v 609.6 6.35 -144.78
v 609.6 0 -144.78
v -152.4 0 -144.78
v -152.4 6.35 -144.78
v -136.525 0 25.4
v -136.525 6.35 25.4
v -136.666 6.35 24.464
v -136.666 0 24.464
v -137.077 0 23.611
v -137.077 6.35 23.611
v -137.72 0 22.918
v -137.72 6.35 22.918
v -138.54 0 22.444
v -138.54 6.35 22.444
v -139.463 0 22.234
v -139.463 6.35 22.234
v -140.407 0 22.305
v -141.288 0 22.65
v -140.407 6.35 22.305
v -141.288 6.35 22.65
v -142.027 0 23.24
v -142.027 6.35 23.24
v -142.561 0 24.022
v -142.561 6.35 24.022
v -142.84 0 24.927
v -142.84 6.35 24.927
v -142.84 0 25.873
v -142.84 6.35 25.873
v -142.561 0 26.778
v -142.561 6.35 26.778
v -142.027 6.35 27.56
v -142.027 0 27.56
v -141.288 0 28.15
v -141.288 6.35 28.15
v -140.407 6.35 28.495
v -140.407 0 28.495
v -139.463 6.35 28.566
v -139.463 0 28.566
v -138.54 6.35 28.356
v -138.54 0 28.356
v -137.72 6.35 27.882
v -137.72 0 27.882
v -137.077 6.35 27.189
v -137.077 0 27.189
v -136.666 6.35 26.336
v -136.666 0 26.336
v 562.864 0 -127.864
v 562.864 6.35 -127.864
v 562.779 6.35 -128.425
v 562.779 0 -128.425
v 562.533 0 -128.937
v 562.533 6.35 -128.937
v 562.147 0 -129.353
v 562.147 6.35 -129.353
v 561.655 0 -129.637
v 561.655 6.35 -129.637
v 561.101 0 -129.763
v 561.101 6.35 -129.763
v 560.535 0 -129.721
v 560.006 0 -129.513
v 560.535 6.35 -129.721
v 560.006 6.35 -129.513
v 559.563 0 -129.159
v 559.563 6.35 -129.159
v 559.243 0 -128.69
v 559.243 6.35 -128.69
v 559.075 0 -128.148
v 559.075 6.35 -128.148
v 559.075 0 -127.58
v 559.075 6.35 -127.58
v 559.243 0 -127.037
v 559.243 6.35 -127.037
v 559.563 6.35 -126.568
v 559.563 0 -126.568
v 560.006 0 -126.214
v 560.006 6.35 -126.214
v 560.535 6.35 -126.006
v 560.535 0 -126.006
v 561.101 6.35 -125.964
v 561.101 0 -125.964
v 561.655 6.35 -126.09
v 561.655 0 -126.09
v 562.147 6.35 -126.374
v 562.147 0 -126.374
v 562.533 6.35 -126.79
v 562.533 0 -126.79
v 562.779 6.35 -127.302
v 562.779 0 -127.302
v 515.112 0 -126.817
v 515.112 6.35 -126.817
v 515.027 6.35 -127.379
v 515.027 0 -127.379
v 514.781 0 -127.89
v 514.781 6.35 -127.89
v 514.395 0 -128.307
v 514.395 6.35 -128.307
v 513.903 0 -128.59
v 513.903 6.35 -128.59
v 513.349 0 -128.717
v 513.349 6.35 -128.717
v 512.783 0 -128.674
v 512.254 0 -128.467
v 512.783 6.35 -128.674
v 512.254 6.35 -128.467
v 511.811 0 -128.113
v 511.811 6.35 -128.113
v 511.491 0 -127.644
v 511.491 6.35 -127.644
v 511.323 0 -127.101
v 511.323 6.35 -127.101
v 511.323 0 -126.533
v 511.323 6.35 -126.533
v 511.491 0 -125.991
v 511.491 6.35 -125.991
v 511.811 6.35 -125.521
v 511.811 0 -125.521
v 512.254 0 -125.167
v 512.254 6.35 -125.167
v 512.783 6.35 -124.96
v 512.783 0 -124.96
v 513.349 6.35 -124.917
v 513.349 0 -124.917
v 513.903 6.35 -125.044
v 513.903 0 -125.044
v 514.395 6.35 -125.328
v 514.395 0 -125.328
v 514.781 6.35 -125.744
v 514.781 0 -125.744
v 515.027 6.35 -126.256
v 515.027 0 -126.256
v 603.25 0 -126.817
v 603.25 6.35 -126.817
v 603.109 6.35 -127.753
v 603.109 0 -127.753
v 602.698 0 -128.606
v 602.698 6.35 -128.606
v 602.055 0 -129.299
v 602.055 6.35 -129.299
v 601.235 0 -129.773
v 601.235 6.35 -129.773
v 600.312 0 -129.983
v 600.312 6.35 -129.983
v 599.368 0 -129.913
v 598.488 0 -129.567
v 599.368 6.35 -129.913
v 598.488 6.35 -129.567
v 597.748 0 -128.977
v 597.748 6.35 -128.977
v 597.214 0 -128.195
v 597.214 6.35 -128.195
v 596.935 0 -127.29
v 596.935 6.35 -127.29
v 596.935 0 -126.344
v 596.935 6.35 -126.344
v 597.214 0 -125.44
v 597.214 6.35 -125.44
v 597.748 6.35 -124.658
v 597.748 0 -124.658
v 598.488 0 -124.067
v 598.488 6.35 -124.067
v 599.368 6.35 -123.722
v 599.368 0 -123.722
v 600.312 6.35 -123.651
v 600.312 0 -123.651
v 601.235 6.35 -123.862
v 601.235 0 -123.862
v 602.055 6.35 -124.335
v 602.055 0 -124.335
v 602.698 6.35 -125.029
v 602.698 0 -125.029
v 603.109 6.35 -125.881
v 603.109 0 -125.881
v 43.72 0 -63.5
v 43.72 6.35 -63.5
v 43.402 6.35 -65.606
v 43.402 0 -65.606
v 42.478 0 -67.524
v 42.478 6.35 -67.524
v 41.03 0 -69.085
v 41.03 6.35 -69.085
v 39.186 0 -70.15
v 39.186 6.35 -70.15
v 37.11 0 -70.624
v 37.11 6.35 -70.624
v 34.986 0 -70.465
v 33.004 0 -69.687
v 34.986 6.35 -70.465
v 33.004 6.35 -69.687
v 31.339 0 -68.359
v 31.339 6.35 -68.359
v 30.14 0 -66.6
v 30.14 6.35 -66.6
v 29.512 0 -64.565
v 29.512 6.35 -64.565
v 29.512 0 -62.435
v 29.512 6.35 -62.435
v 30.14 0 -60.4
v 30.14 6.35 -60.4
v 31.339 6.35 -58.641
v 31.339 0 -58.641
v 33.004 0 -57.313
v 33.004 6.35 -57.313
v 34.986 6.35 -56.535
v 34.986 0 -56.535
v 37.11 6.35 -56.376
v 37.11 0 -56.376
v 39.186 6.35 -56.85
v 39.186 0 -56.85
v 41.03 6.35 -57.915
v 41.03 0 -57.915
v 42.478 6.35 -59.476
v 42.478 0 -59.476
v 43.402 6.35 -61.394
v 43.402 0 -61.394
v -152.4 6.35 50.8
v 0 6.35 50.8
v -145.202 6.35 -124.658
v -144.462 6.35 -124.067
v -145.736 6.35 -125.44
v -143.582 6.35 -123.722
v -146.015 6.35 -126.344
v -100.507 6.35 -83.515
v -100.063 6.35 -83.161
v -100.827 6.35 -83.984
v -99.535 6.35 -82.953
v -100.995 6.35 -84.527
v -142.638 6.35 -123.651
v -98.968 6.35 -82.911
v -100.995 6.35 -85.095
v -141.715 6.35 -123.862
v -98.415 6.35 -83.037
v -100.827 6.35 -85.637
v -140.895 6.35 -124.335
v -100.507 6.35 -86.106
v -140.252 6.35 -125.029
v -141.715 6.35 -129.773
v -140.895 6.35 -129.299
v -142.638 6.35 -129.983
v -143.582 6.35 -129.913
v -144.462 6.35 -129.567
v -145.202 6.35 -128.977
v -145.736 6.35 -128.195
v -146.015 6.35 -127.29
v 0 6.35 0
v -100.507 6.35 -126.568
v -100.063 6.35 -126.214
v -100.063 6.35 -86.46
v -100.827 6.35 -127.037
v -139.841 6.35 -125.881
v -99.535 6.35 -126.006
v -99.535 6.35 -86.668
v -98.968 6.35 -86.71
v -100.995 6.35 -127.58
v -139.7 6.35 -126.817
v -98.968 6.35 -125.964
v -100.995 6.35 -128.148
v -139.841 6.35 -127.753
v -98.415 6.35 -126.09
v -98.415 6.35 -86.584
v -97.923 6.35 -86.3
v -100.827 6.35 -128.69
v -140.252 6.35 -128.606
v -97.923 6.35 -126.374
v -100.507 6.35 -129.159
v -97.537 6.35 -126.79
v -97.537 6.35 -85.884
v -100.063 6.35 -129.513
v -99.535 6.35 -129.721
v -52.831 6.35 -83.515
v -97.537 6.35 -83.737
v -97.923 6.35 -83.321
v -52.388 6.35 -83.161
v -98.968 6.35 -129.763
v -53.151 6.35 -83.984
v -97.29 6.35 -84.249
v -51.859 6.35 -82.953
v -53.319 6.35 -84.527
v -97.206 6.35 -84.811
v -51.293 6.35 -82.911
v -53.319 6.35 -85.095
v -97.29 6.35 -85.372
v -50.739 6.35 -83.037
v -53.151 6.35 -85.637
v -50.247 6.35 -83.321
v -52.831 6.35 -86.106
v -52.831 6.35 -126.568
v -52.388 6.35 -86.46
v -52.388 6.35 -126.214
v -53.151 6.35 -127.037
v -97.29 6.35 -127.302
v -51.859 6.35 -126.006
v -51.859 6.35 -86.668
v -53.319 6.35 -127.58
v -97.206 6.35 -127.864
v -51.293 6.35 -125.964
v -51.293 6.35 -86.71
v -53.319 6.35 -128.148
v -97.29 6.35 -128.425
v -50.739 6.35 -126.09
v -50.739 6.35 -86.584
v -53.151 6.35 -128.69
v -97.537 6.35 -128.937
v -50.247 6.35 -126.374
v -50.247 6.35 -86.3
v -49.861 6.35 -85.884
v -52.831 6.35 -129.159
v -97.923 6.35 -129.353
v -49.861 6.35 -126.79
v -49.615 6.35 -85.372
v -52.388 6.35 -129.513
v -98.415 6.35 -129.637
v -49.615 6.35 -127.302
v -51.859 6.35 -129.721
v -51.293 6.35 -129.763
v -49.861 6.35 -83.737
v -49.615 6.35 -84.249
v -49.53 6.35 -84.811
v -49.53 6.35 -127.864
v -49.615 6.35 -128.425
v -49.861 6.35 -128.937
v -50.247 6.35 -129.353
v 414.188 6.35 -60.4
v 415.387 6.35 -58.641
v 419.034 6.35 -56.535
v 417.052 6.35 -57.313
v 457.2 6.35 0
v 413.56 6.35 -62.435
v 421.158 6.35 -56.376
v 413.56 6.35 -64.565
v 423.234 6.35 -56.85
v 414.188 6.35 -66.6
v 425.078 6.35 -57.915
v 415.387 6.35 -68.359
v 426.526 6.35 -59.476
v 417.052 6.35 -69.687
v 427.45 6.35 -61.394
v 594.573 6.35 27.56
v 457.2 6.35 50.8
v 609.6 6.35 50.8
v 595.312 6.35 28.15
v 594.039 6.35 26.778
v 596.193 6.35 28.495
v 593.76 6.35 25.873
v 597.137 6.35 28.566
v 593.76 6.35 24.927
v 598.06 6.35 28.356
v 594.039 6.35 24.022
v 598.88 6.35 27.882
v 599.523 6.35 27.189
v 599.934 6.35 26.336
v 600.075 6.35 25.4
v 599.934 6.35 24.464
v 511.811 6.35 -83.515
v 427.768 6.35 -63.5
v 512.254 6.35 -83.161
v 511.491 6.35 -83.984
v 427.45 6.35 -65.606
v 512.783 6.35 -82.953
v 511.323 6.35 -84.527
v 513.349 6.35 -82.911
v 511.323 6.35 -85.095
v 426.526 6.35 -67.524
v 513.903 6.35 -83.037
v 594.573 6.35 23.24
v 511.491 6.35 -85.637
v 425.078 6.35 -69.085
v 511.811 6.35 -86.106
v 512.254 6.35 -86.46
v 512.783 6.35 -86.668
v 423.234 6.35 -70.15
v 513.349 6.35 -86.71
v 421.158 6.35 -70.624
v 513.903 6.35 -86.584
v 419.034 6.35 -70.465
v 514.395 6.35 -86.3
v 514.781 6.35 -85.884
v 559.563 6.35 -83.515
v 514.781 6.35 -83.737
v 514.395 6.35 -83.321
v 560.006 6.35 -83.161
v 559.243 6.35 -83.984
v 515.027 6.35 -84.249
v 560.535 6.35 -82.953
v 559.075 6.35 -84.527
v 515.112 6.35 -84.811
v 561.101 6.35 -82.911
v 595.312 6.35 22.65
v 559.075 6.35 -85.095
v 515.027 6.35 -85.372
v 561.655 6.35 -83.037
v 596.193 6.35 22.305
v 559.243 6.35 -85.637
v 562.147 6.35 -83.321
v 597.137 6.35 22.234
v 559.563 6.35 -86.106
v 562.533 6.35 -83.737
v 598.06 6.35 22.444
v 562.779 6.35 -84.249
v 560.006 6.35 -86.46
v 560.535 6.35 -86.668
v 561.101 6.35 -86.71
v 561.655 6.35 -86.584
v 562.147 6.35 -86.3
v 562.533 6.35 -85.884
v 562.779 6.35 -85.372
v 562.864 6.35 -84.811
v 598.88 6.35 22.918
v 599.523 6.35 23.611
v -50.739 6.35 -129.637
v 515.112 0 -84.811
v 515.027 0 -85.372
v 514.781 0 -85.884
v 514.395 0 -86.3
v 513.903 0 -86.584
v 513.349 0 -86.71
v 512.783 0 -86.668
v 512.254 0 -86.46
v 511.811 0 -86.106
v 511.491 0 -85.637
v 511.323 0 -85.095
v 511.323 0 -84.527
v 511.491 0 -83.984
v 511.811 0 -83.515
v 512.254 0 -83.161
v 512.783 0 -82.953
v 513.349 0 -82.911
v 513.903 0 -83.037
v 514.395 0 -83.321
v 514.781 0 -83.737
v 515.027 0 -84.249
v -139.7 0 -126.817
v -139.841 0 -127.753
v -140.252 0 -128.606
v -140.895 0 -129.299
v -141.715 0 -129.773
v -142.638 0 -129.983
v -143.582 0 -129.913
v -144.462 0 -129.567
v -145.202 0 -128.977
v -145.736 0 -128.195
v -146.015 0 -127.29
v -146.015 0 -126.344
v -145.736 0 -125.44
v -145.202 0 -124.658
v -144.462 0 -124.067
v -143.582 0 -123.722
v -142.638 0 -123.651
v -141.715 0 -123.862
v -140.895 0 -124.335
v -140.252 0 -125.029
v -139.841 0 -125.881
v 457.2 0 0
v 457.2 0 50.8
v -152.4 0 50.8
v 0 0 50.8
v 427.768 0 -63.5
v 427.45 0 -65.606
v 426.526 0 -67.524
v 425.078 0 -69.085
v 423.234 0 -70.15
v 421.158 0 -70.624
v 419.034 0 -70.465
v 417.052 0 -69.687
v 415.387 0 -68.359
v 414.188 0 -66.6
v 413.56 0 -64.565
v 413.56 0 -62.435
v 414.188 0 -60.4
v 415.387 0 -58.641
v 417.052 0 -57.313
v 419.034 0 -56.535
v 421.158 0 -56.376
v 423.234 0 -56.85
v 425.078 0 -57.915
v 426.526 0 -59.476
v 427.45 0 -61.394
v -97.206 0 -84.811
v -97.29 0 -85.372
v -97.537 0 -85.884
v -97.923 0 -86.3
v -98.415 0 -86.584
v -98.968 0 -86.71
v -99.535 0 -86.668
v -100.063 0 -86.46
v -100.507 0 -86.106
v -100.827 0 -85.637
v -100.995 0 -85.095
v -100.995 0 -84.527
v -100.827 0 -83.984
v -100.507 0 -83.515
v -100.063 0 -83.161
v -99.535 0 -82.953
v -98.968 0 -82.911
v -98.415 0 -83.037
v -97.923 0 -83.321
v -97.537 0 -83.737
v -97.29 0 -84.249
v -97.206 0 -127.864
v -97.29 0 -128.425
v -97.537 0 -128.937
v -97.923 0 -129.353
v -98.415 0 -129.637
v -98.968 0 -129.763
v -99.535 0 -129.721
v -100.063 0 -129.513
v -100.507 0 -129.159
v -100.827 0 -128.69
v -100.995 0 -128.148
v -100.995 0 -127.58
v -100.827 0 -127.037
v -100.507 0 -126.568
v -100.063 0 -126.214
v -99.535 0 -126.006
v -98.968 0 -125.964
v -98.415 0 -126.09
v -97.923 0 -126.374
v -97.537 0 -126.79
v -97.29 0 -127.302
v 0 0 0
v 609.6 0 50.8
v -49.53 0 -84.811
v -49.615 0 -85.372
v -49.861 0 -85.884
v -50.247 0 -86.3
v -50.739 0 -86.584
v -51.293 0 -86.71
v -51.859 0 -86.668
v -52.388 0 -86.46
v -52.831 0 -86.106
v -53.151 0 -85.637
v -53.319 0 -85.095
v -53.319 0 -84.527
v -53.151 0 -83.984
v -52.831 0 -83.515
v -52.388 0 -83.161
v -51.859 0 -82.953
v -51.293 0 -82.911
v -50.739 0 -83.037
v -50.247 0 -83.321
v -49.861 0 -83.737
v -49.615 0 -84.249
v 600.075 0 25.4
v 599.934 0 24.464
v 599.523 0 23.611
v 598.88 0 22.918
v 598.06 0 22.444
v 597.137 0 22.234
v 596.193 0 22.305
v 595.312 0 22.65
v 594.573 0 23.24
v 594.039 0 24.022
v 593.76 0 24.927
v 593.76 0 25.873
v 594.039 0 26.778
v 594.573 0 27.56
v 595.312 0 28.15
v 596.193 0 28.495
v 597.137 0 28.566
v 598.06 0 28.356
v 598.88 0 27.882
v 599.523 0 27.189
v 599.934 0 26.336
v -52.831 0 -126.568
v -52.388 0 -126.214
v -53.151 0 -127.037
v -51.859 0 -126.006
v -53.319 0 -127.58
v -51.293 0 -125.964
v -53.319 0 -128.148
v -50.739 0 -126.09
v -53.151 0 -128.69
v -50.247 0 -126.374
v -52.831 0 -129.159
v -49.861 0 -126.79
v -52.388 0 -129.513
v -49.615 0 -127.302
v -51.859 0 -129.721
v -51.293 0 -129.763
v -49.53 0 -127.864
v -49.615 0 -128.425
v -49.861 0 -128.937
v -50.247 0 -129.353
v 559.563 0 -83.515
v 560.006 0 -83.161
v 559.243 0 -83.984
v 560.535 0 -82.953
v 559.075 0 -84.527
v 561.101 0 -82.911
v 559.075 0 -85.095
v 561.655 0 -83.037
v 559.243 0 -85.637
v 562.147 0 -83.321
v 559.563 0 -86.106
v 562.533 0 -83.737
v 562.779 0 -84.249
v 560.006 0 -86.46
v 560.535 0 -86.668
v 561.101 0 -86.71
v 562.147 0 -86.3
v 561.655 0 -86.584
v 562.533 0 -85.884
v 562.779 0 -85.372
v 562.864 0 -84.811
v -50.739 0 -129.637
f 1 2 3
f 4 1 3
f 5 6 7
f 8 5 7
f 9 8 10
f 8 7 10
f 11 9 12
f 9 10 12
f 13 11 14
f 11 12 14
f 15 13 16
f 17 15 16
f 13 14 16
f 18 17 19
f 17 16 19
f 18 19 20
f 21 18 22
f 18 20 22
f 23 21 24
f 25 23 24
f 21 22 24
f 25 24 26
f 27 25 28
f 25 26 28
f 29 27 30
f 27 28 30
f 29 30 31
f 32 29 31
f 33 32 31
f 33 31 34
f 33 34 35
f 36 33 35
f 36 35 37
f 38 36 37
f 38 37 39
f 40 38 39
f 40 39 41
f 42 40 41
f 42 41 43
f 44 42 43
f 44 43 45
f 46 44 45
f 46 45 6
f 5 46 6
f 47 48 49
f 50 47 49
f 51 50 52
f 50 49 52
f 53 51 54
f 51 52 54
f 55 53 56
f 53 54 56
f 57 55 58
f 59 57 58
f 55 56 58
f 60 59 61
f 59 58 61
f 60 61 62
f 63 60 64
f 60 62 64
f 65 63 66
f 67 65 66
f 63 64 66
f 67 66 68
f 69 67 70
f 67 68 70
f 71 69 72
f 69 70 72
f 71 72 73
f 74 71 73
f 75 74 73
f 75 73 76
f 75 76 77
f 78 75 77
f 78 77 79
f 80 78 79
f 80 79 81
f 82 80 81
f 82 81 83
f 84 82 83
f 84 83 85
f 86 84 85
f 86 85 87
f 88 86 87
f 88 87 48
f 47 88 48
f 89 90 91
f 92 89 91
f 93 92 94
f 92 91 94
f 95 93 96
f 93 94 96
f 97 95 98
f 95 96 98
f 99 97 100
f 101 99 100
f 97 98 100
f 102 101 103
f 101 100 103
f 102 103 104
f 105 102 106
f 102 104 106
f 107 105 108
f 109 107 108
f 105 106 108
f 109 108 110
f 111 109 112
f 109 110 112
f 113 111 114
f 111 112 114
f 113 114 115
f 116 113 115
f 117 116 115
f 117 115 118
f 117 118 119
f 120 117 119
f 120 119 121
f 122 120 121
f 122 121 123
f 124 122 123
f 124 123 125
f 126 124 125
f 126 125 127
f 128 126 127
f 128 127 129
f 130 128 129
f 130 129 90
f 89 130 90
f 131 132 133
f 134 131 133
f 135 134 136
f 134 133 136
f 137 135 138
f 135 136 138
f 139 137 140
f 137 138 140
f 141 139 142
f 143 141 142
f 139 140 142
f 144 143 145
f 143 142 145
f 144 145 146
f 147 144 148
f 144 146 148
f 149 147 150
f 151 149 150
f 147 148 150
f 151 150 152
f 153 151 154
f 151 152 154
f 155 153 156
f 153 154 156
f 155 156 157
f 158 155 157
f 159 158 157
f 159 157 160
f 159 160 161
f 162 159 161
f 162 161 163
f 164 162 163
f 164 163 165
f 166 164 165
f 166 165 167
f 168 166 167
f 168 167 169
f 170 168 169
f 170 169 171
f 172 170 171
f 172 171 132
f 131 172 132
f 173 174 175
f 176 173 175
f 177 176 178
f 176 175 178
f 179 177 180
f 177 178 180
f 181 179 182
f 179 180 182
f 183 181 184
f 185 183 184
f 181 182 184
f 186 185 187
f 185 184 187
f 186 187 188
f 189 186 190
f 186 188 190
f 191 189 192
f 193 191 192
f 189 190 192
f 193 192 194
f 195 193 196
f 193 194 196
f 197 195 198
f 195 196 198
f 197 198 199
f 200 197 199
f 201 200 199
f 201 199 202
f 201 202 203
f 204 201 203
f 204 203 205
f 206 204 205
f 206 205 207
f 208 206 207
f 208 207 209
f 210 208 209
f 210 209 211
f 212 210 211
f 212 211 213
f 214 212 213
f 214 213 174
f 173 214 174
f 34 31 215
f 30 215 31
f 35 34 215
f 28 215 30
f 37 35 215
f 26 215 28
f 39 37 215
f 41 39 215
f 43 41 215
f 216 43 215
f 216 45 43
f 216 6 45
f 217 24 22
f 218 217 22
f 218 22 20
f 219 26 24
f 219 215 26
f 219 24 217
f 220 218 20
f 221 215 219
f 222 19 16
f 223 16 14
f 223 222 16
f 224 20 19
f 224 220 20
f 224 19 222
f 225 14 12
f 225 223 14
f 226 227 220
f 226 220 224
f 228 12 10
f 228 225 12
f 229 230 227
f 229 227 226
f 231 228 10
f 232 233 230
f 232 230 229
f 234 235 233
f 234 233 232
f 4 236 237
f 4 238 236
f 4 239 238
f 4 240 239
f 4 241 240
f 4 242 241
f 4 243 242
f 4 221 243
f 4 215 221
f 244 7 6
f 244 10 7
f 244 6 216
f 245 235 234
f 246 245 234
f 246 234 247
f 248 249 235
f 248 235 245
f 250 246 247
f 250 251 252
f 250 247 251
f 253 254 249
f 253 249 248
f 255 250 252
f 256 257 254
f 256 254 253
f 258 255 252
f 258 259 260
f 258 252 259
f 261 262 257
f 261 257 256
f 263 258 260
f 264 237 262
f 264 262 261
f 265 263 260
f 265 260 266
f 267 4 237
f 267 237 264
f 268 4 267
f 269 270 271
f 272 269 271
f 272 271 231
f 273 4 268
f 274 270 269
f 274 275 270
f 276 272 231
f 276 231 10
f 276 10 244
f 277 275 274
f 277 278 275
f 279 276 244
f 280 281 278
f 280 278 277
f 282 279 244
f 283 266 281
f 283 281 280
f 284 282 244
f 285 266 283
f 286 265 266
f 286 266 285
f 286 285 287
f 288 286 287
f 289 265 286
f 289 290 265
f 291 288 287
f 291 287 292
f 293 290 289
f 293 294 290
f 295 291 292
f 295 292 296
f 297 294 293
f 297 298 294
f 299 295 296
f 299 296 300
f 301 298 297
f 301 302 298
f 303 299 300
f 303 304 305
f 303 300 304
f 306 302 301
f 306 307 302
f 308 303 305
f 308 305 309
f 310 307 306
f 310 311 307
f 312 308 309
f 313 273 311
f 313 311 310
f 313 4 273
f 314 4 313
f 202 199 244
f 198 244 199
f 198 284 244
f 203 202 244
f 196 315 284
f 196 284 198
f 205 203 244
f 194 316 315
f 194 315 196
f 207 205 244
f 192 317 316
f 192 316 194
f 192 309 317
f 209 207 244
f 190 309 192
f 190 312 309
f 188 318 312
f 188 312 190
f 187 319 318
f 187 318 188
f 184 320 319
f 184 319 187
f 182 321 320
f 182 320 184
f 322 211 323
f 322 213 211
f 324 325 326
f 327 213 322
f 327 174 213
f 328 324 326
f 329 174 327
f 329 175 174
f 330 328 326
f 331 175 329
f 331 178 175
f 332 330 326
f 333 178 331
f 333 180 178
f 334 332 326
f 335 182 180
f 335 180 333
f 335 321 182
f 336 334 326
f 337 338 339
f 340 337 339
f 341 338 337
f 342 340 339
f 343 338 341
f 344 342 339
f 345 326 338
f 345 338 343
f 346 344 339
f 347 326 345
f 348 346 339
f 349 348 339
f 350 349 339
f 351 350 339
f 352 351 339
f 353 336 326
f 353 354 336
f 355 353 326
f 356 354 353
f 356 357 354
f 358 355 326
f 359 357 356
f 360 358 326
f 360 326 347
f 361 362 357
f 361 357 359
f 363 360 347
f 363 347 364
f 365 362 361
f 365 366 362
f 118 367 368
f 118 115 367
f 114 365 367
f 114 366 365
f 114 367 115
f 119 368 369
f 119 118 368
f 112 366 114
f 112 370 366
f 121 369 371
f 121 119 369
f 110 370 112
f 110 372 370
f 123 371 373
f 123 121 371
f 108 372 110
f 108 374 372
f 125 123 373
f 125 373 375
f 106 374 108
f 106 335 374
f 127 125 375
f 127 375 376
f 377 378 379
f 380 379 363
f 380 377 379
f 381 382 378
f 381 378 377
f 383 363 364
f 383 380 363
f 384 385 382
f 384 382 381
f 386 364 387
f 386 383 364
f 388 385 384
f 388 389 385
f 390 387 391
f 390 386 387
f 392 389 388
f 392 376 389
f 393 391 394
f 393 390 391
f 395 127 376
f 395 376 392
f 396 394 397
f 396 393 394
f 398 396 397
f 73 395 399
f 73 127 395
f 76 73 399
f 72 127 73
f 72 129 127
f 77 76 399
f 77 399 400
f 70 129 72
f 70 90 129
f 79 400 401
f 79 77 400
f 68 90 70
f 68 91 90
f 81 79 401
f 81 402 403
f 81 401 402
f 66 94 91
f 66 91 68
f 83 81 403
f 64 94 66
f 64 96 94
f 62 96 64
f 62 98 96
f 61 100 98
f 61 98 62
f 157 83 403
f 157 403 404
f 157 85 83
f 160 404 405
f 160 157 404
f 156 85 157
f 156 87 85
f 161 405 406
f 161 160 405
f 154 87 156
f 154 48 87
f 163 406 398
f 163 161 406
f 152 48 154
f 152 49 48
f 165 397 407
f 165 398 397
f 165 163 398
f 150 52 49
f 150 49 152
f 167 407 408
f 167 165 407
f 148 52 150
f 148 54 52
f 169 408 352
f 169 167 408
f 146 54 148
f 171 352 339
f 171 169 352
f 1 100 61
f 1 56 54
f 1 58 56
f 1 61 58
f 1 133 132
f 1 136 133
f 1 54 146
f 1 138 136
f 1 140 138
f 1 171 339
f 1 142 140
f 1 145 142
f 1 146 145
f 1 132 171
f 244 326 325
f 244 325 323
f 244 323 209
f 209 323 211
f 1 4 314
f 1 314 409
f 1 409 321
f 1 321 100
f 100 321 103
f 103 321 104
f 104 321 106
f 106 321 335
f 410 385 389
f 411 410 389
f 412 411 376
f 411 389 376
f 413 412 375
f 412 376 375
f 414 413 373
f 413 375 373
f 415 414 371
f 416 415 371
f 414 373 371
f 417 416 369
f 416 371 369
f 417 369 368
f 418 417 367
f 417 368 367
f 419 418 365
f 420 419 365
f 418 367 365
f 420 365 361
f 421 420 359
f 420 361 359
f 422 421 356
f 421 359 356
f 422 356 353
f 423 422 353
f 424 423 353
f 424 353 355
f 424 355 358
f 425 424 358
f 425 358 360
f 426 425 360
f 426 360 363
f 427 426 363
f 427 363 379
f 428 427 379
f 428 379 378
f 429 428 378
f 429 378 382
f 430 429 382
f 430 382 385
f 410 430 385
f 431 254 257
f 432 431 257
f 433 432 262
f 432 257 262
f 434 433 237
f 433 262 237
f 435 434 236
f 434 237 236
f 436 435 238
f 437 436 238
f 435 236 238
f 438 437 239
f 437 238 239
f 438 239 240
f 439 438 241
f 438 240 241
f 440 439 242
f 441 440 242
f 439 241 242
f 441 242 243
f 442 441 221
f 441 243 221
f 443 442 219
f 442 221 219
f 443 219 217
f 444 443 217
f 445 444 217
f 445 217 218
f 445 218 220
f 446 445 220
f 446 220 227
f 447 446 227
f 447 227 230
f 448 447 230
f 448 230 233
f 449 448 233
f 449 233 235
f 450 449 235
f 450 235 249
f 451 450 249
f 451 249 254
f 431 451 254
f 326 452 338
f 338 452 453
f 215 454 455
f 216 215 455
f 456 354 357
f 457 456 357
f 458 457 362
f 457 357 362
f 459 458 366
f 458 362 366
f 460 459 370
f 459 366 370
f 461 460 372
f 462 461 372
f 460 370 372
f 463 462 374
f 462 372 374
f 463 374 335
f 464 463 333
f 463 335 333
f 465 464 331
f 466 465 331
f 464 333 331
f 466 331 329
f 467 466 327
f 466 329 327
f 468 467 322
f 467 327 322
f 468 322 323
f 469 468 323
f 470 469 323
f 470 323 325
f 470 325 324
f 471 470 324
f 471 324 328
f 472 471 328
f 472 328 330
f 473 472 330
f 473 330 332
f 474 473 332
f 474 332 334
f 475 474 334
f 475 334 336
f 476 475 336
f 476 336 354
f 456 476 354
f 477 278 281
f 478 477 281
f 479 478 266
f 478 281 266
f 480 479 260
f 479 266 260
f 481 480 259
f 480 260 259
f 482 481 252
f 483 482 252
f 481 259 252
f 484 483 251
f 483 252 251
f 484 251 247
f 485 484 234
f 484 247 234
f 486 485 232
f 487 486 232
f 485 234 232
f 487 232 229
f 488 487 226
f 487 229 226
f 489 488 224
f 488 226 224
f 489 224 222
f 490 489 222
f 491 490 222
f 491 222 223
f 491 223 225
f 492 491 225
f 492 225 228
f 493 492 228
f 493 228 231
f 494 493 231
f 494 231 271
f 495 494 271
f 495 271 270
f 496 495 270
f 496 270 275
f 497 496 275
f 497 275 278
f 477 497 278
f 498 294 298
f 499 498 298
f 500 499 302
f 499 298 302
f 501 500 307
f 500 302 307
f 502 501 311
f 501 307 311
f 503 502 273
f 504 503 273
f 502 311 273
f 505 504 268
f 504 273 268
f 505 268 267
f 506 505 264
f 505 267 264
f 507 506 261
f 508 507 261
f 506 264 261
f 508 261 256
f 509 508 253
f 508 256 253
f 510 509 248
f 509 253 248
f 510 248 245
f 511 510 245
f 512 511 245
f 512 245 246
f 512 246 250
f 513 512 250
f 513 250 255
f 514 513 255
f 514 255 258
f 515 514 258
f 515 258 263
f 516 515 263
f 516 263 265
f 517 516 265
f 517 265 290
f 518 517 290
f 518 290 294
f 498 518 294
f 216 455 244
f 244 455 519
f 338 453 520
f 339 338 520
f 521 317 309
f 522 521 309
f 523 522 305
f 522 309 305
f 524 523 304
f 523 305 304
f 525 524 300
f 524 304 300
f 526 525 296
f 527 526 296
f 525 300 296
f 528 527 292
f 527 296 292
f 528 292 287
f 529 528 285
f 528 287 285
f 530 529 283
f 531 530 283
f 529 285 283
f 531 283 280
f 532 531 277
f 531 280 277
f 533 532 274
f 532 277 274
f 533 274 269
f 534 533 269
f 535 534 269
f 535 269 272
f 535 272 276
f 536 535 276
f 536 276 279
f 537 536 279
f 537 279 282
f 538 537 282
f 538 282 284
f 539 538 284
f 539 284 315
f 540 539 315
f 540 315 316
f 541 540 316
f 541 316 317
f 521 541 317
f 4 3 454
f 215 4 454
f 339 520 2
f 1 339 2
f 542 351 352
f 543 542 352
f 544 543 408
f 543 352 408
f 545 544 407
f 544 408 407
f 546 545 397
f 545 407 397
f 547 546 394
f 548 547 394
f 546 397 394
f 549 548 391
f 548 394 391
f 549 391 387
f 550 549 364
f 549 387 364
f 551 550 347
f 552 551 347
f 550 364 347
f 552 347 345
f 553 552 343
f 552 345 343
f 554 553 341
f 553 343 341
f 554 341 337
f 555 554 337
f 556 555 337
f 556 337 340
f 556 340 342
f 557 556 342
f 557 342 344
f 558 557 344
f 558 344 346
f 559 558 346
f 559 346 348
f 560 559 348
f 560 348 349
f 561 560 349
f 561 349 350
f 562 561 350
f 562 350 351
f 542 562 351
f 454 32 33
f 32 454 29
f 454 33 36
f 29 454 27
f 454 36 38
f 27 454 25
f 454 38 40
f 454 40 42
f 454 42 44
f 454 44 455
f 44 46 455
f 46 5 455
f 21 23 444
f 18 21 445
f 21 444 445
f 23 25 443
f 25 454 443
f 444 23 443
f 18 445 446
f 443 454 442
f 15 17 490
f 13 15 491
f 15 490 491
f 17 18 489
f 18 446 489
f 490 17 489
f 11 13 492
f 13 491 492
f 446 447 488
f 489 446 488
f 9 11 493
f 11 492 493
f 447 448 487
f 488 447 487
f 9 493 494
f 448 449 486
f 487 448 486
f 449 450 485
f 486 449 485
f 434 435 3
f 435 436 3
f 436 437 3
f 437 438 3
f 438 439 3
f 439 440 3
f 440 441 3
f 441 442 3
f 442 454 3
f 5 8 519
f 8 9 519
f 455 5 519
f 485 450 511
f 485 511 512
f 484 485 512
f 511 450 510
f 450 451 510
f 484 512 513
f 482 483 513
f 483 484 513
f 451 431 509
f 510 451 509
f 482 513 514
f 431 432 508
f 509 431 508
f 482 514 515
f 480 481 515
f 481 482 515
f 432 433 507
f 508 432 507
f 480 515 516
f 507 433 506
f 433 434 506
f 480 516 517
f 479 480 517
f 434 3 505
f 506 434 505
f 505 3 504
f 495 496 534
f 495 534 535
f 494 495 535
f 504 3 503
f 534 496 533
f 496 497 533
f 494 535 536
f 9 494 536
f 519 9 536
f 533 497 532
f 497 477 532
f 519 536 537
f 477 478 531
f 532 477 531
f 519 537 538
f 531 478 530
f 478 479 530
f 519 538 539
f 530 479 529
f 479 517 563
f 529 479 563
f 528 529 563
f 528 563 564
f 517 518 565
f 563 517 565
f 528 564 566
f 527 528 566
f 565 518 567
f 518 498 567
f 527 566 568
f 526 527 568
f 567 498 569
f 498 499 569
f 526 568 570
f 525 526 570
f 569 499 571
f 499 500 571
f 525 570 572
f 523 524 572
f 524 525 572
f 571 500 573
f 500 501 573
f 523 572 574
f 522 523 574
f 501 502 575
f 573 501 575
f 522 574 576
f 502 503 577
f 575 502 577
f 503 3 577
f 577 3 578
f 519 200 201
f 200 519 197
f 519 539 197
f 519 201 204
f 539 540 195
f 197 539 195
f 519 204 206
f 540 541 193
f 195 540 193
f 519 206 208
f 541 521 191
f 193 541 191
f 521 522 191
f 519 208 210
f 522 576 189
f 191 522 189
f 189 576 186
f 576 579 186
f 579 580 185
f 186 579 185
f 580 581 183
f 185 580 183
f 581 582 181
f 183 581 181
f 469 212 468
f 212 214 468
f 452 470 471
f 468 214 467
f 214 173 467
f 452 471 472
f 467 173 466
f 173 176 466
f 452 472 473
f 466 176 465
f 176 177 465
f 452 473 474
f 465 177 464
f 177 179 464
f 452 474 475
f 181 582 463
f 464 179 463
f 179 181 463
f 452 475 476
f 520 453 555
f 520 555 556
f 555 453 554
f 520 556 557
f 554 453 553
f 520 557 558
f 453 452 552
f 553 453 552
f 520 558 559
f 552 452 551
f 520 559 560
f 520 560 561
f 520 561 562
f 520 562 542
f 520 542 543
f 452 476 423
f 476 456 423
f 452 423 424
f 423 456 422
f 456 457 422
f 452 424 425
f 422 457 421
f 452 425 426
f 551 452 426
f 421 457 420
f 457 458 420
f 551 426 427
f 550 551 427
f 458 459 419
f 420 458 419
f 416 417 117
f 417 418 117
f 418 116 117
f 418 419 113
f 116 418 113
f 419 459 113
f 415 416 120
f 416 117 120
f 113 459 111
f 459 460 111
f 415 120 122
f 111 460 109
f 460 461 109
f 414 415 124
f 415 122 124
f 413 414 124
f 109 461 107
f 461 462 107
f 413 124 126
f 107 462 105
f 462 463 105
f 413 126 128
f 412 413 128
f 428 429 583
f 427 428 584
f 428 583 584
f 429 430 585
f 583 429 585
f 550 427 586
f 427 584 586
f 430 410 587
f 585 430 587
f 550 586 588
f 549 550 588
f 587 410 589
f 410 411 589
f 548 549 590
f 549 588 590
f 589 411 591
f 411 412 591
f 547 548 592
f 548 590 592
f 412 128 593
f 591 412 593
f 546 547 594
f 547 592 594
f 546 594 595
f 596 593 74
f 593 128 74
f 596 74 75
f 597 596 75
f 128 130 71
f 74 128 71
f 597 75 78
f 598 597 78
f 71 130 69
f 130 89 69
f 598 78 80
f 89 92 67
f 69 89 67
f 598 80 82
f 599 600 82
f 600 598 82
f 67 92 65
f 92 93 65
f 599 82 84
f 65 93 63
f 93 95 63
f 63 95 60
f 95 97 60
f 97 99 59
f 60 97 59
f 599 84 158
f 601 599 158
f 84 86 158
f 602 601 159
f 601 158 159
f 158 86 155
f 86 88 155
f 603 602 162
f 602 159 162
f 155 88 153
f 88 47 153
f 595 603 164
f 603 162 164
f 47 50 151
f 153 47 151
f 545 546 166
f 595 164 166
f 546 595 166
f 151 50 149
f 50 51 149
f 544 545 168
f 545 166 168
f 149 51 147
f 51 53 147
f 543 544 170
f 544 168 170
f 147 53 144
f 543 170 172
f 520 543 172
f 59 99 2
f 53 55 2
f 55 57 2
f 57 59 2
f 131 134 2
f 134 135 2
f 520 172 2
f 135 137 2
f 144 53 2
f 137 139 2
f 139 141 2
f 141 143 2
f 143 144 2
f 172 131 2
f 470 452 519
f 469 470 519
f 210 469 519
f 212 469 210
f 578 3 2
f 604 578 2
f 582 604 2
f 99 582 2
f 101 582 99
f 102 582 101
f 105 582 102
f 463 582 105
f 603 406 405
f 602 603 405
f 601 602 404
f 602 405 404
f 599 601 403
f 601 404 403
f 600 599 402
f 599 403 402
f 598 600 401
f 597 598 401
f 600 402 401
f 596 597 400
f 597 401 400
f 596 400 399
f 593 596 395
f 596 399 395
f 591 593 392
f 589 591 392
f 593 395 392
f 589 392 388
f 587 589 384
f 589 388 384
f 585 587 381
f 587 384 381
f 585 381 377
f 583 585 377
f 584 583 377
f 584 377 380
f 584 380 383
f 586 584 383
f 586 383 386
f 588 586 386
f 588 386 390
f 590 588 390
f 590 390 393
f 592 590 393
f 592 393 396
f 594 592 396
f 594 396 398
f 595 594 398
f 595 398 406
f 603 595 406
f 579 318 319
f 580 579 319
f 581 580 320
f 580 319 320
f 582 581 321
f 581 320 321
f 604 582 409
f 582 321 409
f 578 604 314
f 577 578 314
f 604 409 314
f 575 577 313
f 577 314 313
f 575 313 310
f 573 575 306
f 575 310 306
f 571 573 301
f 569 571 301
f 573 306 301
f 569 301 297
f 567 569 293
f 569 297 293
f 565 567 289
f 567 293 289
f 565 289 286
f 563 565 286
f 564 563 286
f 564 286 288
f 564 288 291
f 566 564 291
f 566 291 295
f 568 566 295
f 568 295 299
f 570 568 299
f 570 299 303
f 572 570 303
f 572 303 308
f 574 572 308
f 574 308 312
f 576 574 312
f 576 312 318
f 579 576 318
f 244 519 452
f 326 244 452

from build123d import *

# Parameters (mm, degrees)
BOSS_EXTRUDE1_DEPTH = 6.35
SKETCH3_R           = 3.175
SKETCH3_R_2         = 1.905
SKETCH3_R_3         = 7.14375
CUT_EXTRUDE1_DEPTH  = 7.62


with BuildPart() as part:
    # Sketch1 → Boss-Extrude1 (new body)
    with BuildSketch(Plane(origin=(0, 0, 0), x_dir=(1, 0, 0), z_dir=(0, 1, 0))):
        Polygon((0, 0), (457.2, 0), (457.2, -50.8), (609.6, -50.8), (609.6, 144.78), (-152.4, 144.78), (-152.4, -50.8), (0, -50.8), align=None)
    extrude(amount=BOSS_EXTRUDE1_DEPTH)

    # Sketch3 → Cut-Extrude1 (cut)
    with BuildSketch(Plane(origin=(0, 6.35, 0), x_dir=(1, 0, 0), z_dir=(0, 1, 0))):
        with Locations((-139.7, -25.4)):
            Circle(SKETCH3_R)
        with Locations((-99.1108, 84.8106)):
            Circle(SKETCH3_R_2)
        with Locations((-142.875, 126.81712)):
            Circle(SKETCH3_R)
        with Locations((-51.435, 84.8106)):
            Circle(SKETCH3_R_2)
        with Locations((-51.435, 127.8636)):
            Circle(SKETCH3_R_2)
        with Locations((36.576, 63.5)):
            Circle(SKETCH3_R_3)
        with Locations((600.075, 126.81712)):
            Circle(SKETCH3_R)
        with Locations((596.9, -25.4)):
            Circle(SKETCH3_R)
        with Locations((560.959, 127.8636)):
            Circle(SKETCH3_R_2)
        with Locations((513.207, 84.8106)):
            Circle(SKETCH3_R_2)
        with Locations((560.959, 84.8106)):
            Circle(SKETCH3_R_2)
        with Locations((513.207, 126.81712)):
            Circle(SKETCH3_R_2)
        with Locations((420.624, 63.5)):
            Circle(SKETCH3_R_3)
        with Locations((-99.1108, 127.8636)):
            Circle(SKETCH3_R_2)
    extrude(amount=-CUT_EXTRUDE1_DEPTH, mode=Mode.SUBTRACT)


solid = part.part
